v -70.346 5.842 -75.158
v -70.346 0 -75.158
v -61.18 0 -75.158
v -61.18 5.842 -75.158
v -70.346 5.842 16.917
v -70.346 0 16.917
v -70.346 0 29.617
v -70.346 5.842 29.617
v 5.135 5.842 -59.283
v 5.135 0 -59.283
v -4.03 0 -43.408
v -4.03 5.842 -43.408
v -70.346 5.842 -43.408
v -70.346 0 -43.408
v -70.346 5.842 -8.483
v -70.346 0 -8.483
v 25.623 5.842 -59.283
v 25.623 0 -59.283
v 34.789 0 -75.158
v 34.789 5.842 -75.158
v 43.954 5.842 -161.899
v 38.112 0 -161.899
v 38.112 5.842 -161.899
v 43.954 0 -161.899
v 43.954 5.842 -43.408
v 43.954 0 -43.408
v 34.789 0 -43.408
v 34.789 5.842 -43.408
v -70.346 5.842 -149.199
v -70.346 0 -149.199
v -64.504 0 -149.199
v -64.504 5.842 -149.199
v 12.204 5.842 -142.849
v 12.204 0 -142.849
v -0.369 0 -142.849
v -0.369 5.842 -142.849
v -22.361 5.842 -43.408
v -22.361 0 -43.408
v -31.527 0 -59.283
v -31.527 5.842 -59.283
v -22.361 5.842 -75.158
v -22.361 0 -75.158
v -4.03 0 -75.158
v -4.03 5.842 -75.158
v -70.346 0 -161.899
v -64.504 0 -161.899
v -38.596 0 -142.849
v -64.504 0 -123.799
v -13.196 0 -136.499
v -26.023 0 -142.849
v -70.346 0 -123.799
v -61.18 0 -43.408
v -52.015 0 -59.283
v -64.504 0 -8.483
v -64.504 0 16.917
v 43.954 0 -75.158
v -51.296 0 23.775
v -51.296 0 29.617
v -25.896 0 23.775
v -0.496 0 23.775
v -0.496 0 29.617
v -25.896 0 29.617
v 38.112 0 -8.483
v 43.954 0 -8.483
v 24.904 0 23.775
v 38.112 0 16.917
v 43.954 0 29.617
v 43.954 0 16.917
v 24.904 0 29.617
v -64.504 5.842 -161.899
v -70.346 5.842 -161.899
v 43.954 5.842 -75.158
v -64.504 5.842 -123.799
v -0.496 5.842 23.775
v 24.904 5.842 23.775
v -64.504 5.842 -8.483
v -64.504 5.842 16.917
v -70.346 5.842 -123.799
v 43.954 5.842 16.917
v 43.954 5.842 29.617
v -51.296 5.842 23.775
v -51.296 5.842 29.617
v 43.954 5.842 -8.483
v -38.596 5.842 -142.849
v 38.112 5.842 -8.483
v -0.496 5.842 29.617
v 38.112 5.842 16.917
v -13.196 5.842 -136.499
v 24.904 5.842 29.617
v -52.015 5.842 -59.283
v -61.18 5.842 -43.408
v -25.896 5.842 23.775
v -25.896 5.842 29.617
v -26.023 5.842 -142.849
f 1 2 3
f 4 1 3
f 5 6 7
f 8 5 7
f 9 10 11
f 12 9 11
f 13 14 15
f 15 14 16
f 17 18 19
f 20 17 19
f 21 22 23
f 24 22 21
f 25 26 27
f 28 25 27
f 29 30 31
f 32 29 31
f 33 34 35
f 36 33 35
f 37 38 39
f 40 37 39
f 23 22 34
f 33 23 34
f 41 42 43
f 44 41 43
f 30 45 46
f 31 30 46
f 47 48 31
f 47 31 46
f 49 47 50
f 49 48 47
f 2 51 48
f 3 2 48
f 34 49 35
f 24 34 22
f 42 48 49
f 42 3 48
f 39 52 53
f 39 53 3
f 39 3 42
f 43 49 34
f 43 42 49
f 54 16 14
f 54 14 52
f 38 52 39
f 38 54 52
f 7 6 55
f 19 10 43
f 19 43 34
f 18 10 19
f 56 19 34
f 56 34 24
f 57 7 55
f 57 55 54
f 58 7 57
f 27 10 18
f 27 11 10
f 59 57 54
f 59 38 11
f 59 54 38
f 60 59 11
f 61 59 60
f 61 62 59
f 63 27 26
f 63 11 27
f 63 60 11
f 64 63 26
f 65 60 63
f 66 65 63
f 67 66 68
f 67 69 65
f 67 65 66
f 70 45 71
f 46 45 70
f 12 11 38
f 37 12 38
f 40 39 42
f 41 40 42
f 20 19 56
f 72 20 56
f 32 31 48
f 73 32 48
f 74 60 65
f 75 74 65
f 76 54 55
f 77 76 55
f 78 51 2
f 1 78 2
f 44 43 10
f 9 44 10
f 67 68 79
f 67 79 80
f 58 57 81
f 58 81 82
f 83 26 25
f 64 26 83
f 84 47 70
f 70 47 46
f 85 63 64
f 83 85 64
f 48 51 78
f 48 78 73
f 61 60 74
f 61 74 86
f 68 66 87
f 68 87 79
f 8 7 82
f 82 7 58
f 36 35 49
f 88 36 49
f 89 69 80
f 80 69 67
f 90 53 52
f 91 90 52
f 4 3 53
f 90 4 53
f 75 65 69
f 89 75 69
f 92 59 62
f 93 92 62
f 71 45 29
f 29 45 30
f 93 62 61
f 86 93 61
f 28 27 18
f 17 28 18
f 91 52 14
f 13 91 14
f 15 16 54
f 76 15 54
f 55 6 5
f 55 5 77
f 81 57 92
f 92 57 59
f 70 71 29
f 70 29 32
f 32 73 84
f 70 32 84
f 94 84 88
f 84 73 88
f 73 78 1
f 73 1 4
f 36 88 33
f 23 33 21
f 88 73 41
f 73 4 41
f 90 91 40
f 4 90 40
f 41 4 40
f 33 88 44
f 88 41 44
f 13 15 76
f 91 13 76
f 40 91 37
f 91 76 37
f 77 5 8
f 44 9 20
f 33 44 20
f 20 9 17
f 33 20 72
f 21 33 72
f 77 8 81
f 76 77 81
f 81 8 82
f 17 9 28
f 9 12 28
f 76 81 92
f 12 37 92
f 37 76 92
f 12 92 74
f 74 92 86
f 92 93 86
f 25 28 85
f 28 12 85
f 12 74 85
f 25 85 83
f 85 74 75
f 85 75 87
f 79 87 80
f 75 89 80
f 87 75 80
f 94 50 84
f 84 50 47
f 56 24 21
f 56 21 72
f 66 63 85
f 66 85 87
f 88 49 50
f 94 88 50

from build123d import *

# Parameters (mm, degrees)
F0_W     = 114.3
F0_H     = 191.516
F1_DEPTH = 5.842
F2_W     = 5.842
F2_H     = 25.4
F2_W_2   = 25.4
F2_H_2   = 5.842
F3_DEPTH = 5.842
F5_DEPTH = 5.842


# Not quite as in the source:
# - a feature names something its author has since deleted; it is built from what else it names


with BuildPart() as f1:
    # F0 (on Front) → F1 (new body)
    with BuildSketch(Plane.XZ):
        with Locations((-13.1958257407, -66.1412229082)):
            Rectangle(F0_W, F0_H)
    extrude(amount=-F1_DEPTH)

    # F2 (on face) → F3 (cut, through all)
    with BuildSketch(Plane.XZ):
        with Locations((-67.4248257407, 4.2167770918)):
            Rectangle(F2_W, F2_H)
        with Locations((-67.4248257407, -136.4992229082)):
            Rectangle(F2_W, F2_H)
        with Locations((41.0331742593, 4.2167770918)):
            Rectangle(F2_W, F2_H)
        with Locations((-38.5958257407, 26.6957770918)):
            Rectangle(F2_W_2, F2_H_2)
        with Locations((12.2041742593, 26.6957770918)):
            Rectangle(F2_W_2, F2_H_2)
        Polygon((-70.3458257407, -75.1582229082), (-70.3458257407, -43.4082229082), (-79.5112612641, -43.4082229082), (-88.6766967875, -59.2832229082), (-79.5112612641, -75.1582229082), align=None)
        Polygon((-61.1803902173, -43.4082229082), (-70.3458257407, -43.4082229082), (-70.3458257407, -75.1582229082), (-61.1803902173, -75.1582229082), (-52.0149546939, -59.2832229082), align=None)
        Polygon((43.9541742593, -75.1582229082), (43.9541742593, -43.4082229082), (34.7887387359, -43.4082229082), (25.6233032125, -59.2832229082), (34.7887387359, -75.1582229082), align=None)
        Polygon((53.1196097827, -43.4082229082), (43.9541742593, -43.4082229082), (43.9541742593, -75.1582229082), (53.1196097827, -75.1582229082), (62.2850453061, -59.2832229082), align=None)
        Polygon((-26.0228257407, -142.8492229082), (-64.5038257407, -161.8992229082), (38.1121742593, -161.8992229082), (-0.3688257407, -142.8492229082), align=None)
        Polygon((-13.1958257407, -136.4992229082), (-26.0228257407, -142.8492229082), (-0.3688257407, -142.8492229082), align=None)
        Polygon((-38.5958257407, -142.8492229082), (-64.5038257407, -161.8992229082), (-26.0228257407, -142.8492229082), align=None)
        Polygon((-0.3688257407, -142.8492229082), (38.1121742593, -161.8992229082), (12.2041742593, -142.8492229082), align=None)
    extrude(amount=-F3_DEPTH, mode=Mode.SUBTRACT)

    # F4 (on face) → F5 (cut, through all)
    with BuildSketch(Plane.XZ):
        Polygon((5.1350453061, -59.2832229082), (-4.0303902173, -43.4082229082), (-22.3612612641, -43.4082229082), (-31.5266967875, -59.2832229082), (-22.3612612641, -75.1582229082), (-4.0303902173, -75.1582229082), align=None)
    extrude(amount=-F5_DEPTH, mode=Mode.SUBTRACT)


solid = f1.part
